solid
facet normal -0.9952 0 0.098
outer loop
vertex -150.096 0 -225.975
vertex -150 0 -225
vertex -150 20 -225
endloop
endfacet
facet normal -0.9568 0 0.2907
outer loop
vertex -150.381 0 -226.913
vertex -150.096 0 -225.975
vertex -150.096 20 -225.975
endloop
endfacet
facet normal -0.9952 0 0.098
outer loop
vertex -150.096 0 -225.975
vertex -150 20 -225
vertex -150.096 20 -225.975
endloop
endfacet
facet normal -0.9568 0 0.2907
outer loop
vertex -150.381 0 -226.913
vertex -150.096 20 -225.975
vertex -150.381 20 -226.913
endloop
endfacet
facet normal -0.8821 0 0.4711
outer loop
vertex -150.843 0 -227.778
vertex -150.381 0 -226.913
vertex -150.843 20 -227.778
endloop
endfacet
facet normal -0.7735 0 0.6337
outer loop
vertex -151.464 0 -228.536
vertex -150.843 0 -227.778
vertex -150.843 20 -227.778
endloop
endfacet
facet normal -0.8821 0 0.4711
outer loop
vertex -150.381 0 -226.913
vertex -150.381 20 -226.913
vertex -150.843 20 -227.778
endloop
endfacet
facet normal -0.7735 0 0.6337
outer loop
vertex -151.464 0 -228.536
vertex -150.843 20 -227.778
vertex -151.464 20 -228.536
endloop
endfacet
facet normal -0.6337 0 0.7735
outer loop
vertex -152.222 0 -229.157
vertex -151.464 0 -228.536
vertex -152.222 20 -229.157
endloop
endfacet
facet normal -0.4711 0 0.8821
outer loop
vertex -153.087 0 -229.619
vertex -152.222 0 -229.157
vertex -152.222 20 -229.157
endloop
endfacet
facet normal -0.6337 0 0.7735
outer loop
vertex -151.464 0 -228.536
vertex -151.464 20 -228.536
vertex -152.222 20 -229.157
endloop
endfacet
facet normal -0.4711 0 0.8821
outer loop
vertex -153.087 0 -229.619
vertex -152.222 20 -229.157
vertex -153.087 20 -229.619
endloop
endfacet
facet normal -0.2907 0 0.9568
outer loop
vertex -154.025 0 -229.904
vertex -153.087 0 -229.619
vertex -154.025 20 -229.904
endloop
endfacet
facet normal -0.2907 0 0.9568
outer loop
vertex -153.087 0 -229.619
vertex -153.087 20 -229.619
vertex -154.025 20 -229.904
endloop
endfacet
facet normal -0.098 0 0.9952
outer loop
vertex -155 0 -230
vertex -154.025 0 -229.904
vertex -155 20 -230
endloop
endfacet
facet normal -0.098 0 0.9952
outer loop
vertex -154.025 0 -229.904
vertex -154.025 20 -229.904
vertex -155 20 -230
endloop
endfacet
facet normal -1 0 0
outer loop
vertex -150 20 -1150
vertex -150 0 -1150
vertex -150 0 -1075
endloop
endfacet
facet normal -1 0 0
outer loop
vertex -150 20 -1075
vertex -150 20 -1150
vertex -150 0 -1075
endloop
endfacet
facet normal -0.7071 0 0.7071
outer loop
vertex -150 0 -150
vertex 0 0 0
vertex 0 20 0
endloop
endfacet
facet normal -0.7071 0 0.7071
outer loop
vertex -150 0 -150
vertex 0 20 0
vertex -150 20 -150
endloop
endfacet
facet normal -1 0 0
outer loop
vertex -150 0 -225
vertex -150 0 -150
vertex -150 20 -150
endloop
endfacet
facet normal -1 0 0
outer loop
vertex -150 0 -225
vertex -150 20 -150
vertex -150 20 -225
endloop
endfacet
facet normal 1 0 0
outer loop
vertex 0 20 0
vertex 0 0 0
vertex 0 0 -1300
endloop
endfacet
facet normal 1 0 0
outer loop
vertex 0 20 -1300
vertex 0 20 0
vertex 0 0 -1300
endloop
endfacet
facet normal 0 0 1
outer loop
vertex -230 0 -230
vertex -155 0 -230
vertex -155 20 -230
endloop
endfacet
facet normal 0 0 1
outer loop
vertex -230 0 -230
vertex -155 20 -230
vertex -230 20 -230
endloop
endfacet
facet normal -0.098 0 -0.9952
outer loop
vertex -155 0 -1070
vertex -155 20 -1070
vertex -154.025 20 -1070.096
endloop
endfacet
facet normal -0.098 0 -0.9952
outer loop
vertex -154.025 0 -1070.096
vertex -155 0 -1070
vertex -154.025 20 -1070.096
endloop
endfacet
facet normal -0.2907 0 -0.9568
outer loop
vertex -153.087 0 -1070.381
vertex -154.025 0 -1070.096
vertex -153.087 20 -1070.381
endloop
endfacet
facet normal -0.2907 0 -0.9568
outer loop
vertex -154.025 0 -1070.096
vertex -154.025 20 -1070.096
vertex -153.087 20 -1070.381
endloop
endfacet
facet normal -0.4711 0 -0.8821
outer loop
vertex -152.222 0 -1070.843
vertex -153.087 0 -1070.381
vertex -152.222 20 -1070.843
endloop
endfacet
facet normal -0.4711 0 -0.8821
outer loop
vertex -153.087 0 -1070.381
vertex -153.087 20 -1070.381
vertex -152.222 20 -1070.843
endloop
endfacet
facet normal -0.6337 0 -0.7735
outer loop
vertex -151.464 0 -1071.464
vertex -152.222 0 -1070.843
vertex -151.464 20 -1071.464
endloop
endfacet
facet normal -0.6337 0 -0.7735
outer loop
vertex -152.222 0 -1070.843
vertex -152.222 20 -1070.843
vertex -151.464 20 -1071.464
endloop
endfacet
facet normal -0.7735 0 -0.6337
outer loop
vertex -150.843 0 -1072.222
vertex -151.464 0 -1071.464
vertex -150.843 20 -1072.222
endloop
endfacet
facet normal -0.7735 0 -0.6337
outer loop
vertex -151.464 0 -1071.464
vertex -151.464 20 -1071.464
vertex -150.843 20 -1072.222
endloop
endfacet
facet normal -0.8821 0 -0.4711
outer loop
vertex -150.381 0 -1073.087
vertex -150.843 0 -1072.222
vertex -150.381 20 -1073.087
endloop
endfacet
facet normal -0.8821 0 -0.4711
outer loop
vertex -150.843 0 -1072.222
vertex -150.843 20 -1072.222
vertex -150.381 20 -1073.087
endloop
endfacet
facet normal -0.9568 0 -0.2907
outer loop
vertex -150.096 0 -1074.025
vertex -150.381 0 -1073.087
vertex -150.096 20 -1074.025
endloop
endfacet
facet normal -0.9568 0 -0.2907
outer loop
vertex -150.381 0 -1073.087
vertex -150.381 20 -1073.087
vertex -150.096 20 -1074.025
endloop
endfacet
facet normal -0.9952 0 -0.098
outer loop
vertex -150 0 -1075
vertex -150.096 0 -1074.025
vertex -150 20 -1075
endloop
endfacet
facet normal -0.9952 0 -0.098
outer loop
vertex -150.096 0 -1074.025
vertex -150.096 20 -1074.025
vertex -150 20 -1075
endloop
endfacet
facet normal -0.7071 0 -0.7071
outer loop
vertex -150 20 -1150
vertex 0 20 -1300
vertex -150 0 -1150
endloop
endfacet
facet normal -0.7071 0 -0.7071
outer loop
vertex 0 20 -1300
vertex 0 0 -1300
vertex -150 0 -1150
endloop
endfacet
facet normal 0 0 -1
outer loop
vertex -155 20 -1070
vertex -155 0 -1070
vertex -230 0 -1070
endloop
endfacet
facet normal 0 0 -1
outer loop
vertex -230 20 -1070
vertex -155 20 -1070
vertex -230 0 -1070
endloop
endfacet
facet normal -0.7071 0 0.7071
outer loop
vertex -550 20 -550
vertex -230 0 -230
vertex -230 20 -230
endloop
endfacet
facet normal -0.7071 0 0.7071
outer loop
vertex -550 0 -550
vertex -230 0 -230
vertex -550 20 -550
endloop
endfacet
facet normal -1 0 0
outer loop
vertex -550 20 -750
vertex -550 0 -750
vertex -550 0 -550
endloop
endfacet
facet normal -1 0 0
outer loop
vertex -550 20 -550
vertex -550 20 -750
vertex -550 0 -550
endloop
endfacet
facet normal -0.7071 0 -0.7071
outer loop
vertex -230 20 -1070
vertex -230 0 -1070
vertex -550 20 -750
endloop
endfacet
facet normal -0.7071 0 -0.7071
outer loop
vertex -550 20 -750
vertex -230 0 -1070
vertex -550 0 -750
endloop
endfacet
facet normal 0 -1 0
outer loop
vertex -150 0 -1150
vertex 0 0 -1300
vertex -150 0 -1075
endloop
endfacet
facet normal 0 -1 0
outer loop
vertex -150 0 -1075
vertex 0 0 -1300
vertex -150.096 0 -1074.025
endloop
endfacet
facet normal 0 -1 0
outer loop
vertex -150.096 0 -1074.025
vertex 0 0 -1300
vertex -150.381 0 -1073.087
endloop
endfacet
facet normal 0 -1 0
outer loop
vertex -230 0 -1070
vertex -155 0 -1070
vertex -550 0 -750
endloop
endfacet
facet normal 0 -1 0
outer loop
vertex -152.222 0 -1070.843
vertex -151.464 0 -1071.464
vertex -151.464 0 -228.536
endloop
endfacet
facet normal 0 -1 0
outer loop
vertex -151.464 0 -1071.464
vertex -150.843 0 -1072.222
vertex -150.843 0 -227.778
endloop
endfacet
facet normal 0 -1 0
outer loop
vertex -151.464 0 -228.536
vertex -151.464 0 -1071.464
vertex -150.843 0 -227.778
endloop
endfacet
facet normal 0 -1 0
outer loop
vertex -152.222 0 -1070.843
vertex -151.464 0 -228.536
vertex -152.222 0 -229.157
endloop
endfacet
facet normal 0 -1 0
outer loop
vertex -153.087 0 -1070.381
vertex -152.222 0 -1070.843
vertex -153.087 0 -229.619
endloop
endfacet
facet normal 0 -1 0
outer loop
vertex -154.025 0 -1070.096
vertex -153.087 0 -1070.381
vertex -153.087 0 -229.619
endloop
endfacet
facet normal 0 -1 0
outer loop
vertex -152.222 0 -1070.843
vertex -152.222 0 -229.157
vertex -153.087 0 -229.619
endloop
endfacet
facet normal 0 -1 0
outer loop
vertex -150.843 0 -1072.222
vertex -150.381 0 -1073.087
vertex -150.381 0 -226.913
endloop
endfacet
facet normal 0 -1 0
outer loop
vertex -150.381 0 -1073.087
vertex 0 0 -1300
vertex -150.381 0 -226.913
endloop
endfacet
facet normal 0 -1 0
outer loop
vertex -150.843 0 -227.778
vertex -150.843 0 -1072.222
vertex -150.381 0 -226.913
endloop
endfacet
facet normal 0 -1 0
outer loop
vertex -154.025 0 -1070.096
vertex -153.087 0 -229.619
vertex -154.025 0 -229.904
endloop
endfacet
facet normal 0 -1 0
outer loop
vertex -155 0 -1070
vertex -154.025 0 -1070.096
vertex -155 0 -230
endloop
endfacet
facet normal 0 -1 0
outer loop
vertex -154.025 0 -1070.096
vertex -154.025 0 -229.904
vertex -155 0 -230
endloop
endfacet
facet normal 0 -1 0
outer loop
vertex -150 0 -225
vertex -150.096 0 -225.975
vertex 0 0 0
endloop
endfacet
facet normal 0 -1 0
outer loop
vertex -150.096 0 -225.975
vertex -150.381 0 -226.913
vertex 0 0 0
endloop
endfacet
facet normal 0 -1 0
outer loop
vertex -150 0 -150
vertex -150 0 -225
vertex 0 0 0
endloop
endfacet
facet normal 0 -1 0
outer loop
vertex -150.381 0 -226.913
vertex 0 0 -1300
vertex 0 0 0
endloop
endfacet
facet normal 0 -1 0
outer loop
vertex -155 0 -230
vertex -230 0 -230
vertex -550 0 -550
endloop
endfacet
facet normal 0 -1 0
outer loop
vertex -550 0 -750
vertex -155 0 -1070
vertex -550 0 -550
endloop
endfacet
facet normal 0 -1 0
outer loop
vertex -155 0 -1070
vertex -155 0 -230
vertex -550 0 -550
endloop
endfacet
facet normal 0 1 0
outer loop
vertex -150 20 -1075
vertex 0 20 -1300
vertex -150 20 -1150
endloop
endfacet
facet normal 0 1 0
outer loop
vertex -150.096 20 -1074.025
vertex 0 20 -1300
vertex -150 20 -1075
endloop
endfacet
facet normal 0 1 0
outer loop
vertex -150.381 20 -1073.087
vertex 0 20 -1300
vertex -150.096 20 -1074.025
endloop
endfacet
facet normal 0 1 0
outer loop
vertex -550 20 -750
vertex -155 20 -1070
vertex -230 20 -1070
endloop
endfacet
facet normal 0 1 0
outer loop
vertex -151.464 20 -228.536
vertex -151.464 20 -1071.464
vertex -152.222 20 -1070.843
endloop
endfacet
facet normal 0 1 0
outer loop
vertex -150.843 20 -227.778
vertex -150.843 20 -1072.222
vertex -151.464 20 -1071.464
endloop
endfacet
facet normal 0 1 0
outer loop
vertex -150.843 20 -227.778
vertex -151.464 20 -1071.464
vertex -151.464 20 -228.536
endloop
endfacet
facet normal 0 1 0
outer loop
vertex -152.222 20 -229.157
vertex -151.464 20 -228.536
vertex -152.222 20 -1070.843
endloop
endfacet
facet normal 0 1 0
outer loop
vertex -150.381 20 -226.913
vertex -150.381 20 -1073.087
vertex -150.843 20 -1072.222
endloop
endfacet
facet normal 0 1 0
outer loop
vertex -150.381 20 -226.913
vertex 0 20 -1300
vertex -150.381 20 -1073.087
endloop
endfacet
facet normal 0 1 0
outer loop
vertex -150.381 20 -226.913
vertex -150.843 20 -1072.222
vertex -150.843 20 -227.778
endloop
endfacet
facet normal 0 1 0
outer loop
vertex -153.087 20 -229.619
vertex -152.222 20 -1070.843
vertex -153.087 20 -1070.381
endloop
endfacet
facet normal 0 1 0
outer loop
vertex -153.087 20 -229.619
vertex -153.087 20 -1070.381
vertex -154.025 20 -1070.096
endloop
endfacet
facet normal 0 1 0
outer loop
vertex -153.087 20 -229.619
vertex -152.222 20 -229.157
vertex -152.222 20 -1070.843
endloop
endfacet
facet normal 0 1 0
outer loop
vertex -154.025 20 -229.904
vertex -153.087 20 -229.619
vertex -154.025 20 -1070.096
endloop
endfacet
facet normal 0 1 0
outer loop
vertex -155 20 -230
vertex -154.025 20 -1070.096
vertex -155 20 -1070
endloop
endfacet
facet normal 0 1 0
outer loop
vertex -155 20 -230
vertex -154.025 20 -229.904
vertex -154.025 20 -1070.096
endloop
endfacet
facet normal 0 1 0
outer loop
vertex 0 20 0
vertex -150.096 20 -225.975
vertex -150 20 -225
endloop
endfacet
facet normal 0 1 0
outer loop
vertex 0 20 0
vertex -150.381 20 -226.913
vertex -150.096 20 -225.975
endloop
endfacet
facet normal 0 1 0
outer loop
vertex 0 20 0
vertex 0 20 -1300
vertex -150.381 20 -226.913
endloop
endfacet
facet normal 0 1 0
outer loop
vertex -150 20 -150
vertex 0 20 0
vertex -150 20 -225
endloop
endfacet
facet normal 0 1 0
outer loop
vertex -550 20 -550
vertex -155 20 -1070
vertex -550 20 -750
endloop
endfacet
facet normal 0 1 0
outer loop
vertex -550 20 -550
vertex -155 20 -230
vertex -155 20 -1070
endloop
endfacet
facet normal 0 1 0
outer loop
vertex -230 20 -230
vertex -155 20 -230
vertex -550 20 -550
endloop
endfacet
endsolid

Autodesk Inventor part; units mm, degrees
ref_plane "YZ Plane" through (0, 0, 0) normal (1, 0, 0) x (0, 1, 0)
ref_plane "XZ Plane" through (0, 0, 0) normal (0, 1, 0) x (-1, 0, 0)
ref_plane "XY Plane" through (0, 0, 0) normal (0, 0, 1) x (1, 0, 0)
sketch "Sketch1" plane through (0, 0, 0) normal (0, 1, 0) x (-1, 0, 0)
  line L0 (0, 0) -> (0, -1300)
  line L1 (550, -750) -> (550, -550)
  line L2 (150, -150) -> (150, -230)
  line L3 (150, -230) -> (230, -230)
  line L4 (0, 0) -> (150, -150)
  line L5 (230, -230) -> (550, -550)
  line L6 (150, -1150) -> (150, -1070)
  line L7 (150, -1070) -> (230, -1070)
  line L8 (0, -1300) -> (150, -1150)
  line L9 (230, -1070) -> (550, -750)
  dimension "d3" = 1300
  dimension "d6" = 550
  dimension "d7" = 150
  dimension "d8" = 80
  dimension "d9" = 45
  dimension "d10" = 80
  dimension "d11" = 150
  dimension "d12" = 45
extrude "Extrusion1" add sketch "Sketch1" along normal blind 20
fillet "Fillet1" radius 5 1 edges at (-150, 10, -230)
fillet "Fillet2" radius 5 1 edges at (-150, 10, -1070)
properties part number "top short"
